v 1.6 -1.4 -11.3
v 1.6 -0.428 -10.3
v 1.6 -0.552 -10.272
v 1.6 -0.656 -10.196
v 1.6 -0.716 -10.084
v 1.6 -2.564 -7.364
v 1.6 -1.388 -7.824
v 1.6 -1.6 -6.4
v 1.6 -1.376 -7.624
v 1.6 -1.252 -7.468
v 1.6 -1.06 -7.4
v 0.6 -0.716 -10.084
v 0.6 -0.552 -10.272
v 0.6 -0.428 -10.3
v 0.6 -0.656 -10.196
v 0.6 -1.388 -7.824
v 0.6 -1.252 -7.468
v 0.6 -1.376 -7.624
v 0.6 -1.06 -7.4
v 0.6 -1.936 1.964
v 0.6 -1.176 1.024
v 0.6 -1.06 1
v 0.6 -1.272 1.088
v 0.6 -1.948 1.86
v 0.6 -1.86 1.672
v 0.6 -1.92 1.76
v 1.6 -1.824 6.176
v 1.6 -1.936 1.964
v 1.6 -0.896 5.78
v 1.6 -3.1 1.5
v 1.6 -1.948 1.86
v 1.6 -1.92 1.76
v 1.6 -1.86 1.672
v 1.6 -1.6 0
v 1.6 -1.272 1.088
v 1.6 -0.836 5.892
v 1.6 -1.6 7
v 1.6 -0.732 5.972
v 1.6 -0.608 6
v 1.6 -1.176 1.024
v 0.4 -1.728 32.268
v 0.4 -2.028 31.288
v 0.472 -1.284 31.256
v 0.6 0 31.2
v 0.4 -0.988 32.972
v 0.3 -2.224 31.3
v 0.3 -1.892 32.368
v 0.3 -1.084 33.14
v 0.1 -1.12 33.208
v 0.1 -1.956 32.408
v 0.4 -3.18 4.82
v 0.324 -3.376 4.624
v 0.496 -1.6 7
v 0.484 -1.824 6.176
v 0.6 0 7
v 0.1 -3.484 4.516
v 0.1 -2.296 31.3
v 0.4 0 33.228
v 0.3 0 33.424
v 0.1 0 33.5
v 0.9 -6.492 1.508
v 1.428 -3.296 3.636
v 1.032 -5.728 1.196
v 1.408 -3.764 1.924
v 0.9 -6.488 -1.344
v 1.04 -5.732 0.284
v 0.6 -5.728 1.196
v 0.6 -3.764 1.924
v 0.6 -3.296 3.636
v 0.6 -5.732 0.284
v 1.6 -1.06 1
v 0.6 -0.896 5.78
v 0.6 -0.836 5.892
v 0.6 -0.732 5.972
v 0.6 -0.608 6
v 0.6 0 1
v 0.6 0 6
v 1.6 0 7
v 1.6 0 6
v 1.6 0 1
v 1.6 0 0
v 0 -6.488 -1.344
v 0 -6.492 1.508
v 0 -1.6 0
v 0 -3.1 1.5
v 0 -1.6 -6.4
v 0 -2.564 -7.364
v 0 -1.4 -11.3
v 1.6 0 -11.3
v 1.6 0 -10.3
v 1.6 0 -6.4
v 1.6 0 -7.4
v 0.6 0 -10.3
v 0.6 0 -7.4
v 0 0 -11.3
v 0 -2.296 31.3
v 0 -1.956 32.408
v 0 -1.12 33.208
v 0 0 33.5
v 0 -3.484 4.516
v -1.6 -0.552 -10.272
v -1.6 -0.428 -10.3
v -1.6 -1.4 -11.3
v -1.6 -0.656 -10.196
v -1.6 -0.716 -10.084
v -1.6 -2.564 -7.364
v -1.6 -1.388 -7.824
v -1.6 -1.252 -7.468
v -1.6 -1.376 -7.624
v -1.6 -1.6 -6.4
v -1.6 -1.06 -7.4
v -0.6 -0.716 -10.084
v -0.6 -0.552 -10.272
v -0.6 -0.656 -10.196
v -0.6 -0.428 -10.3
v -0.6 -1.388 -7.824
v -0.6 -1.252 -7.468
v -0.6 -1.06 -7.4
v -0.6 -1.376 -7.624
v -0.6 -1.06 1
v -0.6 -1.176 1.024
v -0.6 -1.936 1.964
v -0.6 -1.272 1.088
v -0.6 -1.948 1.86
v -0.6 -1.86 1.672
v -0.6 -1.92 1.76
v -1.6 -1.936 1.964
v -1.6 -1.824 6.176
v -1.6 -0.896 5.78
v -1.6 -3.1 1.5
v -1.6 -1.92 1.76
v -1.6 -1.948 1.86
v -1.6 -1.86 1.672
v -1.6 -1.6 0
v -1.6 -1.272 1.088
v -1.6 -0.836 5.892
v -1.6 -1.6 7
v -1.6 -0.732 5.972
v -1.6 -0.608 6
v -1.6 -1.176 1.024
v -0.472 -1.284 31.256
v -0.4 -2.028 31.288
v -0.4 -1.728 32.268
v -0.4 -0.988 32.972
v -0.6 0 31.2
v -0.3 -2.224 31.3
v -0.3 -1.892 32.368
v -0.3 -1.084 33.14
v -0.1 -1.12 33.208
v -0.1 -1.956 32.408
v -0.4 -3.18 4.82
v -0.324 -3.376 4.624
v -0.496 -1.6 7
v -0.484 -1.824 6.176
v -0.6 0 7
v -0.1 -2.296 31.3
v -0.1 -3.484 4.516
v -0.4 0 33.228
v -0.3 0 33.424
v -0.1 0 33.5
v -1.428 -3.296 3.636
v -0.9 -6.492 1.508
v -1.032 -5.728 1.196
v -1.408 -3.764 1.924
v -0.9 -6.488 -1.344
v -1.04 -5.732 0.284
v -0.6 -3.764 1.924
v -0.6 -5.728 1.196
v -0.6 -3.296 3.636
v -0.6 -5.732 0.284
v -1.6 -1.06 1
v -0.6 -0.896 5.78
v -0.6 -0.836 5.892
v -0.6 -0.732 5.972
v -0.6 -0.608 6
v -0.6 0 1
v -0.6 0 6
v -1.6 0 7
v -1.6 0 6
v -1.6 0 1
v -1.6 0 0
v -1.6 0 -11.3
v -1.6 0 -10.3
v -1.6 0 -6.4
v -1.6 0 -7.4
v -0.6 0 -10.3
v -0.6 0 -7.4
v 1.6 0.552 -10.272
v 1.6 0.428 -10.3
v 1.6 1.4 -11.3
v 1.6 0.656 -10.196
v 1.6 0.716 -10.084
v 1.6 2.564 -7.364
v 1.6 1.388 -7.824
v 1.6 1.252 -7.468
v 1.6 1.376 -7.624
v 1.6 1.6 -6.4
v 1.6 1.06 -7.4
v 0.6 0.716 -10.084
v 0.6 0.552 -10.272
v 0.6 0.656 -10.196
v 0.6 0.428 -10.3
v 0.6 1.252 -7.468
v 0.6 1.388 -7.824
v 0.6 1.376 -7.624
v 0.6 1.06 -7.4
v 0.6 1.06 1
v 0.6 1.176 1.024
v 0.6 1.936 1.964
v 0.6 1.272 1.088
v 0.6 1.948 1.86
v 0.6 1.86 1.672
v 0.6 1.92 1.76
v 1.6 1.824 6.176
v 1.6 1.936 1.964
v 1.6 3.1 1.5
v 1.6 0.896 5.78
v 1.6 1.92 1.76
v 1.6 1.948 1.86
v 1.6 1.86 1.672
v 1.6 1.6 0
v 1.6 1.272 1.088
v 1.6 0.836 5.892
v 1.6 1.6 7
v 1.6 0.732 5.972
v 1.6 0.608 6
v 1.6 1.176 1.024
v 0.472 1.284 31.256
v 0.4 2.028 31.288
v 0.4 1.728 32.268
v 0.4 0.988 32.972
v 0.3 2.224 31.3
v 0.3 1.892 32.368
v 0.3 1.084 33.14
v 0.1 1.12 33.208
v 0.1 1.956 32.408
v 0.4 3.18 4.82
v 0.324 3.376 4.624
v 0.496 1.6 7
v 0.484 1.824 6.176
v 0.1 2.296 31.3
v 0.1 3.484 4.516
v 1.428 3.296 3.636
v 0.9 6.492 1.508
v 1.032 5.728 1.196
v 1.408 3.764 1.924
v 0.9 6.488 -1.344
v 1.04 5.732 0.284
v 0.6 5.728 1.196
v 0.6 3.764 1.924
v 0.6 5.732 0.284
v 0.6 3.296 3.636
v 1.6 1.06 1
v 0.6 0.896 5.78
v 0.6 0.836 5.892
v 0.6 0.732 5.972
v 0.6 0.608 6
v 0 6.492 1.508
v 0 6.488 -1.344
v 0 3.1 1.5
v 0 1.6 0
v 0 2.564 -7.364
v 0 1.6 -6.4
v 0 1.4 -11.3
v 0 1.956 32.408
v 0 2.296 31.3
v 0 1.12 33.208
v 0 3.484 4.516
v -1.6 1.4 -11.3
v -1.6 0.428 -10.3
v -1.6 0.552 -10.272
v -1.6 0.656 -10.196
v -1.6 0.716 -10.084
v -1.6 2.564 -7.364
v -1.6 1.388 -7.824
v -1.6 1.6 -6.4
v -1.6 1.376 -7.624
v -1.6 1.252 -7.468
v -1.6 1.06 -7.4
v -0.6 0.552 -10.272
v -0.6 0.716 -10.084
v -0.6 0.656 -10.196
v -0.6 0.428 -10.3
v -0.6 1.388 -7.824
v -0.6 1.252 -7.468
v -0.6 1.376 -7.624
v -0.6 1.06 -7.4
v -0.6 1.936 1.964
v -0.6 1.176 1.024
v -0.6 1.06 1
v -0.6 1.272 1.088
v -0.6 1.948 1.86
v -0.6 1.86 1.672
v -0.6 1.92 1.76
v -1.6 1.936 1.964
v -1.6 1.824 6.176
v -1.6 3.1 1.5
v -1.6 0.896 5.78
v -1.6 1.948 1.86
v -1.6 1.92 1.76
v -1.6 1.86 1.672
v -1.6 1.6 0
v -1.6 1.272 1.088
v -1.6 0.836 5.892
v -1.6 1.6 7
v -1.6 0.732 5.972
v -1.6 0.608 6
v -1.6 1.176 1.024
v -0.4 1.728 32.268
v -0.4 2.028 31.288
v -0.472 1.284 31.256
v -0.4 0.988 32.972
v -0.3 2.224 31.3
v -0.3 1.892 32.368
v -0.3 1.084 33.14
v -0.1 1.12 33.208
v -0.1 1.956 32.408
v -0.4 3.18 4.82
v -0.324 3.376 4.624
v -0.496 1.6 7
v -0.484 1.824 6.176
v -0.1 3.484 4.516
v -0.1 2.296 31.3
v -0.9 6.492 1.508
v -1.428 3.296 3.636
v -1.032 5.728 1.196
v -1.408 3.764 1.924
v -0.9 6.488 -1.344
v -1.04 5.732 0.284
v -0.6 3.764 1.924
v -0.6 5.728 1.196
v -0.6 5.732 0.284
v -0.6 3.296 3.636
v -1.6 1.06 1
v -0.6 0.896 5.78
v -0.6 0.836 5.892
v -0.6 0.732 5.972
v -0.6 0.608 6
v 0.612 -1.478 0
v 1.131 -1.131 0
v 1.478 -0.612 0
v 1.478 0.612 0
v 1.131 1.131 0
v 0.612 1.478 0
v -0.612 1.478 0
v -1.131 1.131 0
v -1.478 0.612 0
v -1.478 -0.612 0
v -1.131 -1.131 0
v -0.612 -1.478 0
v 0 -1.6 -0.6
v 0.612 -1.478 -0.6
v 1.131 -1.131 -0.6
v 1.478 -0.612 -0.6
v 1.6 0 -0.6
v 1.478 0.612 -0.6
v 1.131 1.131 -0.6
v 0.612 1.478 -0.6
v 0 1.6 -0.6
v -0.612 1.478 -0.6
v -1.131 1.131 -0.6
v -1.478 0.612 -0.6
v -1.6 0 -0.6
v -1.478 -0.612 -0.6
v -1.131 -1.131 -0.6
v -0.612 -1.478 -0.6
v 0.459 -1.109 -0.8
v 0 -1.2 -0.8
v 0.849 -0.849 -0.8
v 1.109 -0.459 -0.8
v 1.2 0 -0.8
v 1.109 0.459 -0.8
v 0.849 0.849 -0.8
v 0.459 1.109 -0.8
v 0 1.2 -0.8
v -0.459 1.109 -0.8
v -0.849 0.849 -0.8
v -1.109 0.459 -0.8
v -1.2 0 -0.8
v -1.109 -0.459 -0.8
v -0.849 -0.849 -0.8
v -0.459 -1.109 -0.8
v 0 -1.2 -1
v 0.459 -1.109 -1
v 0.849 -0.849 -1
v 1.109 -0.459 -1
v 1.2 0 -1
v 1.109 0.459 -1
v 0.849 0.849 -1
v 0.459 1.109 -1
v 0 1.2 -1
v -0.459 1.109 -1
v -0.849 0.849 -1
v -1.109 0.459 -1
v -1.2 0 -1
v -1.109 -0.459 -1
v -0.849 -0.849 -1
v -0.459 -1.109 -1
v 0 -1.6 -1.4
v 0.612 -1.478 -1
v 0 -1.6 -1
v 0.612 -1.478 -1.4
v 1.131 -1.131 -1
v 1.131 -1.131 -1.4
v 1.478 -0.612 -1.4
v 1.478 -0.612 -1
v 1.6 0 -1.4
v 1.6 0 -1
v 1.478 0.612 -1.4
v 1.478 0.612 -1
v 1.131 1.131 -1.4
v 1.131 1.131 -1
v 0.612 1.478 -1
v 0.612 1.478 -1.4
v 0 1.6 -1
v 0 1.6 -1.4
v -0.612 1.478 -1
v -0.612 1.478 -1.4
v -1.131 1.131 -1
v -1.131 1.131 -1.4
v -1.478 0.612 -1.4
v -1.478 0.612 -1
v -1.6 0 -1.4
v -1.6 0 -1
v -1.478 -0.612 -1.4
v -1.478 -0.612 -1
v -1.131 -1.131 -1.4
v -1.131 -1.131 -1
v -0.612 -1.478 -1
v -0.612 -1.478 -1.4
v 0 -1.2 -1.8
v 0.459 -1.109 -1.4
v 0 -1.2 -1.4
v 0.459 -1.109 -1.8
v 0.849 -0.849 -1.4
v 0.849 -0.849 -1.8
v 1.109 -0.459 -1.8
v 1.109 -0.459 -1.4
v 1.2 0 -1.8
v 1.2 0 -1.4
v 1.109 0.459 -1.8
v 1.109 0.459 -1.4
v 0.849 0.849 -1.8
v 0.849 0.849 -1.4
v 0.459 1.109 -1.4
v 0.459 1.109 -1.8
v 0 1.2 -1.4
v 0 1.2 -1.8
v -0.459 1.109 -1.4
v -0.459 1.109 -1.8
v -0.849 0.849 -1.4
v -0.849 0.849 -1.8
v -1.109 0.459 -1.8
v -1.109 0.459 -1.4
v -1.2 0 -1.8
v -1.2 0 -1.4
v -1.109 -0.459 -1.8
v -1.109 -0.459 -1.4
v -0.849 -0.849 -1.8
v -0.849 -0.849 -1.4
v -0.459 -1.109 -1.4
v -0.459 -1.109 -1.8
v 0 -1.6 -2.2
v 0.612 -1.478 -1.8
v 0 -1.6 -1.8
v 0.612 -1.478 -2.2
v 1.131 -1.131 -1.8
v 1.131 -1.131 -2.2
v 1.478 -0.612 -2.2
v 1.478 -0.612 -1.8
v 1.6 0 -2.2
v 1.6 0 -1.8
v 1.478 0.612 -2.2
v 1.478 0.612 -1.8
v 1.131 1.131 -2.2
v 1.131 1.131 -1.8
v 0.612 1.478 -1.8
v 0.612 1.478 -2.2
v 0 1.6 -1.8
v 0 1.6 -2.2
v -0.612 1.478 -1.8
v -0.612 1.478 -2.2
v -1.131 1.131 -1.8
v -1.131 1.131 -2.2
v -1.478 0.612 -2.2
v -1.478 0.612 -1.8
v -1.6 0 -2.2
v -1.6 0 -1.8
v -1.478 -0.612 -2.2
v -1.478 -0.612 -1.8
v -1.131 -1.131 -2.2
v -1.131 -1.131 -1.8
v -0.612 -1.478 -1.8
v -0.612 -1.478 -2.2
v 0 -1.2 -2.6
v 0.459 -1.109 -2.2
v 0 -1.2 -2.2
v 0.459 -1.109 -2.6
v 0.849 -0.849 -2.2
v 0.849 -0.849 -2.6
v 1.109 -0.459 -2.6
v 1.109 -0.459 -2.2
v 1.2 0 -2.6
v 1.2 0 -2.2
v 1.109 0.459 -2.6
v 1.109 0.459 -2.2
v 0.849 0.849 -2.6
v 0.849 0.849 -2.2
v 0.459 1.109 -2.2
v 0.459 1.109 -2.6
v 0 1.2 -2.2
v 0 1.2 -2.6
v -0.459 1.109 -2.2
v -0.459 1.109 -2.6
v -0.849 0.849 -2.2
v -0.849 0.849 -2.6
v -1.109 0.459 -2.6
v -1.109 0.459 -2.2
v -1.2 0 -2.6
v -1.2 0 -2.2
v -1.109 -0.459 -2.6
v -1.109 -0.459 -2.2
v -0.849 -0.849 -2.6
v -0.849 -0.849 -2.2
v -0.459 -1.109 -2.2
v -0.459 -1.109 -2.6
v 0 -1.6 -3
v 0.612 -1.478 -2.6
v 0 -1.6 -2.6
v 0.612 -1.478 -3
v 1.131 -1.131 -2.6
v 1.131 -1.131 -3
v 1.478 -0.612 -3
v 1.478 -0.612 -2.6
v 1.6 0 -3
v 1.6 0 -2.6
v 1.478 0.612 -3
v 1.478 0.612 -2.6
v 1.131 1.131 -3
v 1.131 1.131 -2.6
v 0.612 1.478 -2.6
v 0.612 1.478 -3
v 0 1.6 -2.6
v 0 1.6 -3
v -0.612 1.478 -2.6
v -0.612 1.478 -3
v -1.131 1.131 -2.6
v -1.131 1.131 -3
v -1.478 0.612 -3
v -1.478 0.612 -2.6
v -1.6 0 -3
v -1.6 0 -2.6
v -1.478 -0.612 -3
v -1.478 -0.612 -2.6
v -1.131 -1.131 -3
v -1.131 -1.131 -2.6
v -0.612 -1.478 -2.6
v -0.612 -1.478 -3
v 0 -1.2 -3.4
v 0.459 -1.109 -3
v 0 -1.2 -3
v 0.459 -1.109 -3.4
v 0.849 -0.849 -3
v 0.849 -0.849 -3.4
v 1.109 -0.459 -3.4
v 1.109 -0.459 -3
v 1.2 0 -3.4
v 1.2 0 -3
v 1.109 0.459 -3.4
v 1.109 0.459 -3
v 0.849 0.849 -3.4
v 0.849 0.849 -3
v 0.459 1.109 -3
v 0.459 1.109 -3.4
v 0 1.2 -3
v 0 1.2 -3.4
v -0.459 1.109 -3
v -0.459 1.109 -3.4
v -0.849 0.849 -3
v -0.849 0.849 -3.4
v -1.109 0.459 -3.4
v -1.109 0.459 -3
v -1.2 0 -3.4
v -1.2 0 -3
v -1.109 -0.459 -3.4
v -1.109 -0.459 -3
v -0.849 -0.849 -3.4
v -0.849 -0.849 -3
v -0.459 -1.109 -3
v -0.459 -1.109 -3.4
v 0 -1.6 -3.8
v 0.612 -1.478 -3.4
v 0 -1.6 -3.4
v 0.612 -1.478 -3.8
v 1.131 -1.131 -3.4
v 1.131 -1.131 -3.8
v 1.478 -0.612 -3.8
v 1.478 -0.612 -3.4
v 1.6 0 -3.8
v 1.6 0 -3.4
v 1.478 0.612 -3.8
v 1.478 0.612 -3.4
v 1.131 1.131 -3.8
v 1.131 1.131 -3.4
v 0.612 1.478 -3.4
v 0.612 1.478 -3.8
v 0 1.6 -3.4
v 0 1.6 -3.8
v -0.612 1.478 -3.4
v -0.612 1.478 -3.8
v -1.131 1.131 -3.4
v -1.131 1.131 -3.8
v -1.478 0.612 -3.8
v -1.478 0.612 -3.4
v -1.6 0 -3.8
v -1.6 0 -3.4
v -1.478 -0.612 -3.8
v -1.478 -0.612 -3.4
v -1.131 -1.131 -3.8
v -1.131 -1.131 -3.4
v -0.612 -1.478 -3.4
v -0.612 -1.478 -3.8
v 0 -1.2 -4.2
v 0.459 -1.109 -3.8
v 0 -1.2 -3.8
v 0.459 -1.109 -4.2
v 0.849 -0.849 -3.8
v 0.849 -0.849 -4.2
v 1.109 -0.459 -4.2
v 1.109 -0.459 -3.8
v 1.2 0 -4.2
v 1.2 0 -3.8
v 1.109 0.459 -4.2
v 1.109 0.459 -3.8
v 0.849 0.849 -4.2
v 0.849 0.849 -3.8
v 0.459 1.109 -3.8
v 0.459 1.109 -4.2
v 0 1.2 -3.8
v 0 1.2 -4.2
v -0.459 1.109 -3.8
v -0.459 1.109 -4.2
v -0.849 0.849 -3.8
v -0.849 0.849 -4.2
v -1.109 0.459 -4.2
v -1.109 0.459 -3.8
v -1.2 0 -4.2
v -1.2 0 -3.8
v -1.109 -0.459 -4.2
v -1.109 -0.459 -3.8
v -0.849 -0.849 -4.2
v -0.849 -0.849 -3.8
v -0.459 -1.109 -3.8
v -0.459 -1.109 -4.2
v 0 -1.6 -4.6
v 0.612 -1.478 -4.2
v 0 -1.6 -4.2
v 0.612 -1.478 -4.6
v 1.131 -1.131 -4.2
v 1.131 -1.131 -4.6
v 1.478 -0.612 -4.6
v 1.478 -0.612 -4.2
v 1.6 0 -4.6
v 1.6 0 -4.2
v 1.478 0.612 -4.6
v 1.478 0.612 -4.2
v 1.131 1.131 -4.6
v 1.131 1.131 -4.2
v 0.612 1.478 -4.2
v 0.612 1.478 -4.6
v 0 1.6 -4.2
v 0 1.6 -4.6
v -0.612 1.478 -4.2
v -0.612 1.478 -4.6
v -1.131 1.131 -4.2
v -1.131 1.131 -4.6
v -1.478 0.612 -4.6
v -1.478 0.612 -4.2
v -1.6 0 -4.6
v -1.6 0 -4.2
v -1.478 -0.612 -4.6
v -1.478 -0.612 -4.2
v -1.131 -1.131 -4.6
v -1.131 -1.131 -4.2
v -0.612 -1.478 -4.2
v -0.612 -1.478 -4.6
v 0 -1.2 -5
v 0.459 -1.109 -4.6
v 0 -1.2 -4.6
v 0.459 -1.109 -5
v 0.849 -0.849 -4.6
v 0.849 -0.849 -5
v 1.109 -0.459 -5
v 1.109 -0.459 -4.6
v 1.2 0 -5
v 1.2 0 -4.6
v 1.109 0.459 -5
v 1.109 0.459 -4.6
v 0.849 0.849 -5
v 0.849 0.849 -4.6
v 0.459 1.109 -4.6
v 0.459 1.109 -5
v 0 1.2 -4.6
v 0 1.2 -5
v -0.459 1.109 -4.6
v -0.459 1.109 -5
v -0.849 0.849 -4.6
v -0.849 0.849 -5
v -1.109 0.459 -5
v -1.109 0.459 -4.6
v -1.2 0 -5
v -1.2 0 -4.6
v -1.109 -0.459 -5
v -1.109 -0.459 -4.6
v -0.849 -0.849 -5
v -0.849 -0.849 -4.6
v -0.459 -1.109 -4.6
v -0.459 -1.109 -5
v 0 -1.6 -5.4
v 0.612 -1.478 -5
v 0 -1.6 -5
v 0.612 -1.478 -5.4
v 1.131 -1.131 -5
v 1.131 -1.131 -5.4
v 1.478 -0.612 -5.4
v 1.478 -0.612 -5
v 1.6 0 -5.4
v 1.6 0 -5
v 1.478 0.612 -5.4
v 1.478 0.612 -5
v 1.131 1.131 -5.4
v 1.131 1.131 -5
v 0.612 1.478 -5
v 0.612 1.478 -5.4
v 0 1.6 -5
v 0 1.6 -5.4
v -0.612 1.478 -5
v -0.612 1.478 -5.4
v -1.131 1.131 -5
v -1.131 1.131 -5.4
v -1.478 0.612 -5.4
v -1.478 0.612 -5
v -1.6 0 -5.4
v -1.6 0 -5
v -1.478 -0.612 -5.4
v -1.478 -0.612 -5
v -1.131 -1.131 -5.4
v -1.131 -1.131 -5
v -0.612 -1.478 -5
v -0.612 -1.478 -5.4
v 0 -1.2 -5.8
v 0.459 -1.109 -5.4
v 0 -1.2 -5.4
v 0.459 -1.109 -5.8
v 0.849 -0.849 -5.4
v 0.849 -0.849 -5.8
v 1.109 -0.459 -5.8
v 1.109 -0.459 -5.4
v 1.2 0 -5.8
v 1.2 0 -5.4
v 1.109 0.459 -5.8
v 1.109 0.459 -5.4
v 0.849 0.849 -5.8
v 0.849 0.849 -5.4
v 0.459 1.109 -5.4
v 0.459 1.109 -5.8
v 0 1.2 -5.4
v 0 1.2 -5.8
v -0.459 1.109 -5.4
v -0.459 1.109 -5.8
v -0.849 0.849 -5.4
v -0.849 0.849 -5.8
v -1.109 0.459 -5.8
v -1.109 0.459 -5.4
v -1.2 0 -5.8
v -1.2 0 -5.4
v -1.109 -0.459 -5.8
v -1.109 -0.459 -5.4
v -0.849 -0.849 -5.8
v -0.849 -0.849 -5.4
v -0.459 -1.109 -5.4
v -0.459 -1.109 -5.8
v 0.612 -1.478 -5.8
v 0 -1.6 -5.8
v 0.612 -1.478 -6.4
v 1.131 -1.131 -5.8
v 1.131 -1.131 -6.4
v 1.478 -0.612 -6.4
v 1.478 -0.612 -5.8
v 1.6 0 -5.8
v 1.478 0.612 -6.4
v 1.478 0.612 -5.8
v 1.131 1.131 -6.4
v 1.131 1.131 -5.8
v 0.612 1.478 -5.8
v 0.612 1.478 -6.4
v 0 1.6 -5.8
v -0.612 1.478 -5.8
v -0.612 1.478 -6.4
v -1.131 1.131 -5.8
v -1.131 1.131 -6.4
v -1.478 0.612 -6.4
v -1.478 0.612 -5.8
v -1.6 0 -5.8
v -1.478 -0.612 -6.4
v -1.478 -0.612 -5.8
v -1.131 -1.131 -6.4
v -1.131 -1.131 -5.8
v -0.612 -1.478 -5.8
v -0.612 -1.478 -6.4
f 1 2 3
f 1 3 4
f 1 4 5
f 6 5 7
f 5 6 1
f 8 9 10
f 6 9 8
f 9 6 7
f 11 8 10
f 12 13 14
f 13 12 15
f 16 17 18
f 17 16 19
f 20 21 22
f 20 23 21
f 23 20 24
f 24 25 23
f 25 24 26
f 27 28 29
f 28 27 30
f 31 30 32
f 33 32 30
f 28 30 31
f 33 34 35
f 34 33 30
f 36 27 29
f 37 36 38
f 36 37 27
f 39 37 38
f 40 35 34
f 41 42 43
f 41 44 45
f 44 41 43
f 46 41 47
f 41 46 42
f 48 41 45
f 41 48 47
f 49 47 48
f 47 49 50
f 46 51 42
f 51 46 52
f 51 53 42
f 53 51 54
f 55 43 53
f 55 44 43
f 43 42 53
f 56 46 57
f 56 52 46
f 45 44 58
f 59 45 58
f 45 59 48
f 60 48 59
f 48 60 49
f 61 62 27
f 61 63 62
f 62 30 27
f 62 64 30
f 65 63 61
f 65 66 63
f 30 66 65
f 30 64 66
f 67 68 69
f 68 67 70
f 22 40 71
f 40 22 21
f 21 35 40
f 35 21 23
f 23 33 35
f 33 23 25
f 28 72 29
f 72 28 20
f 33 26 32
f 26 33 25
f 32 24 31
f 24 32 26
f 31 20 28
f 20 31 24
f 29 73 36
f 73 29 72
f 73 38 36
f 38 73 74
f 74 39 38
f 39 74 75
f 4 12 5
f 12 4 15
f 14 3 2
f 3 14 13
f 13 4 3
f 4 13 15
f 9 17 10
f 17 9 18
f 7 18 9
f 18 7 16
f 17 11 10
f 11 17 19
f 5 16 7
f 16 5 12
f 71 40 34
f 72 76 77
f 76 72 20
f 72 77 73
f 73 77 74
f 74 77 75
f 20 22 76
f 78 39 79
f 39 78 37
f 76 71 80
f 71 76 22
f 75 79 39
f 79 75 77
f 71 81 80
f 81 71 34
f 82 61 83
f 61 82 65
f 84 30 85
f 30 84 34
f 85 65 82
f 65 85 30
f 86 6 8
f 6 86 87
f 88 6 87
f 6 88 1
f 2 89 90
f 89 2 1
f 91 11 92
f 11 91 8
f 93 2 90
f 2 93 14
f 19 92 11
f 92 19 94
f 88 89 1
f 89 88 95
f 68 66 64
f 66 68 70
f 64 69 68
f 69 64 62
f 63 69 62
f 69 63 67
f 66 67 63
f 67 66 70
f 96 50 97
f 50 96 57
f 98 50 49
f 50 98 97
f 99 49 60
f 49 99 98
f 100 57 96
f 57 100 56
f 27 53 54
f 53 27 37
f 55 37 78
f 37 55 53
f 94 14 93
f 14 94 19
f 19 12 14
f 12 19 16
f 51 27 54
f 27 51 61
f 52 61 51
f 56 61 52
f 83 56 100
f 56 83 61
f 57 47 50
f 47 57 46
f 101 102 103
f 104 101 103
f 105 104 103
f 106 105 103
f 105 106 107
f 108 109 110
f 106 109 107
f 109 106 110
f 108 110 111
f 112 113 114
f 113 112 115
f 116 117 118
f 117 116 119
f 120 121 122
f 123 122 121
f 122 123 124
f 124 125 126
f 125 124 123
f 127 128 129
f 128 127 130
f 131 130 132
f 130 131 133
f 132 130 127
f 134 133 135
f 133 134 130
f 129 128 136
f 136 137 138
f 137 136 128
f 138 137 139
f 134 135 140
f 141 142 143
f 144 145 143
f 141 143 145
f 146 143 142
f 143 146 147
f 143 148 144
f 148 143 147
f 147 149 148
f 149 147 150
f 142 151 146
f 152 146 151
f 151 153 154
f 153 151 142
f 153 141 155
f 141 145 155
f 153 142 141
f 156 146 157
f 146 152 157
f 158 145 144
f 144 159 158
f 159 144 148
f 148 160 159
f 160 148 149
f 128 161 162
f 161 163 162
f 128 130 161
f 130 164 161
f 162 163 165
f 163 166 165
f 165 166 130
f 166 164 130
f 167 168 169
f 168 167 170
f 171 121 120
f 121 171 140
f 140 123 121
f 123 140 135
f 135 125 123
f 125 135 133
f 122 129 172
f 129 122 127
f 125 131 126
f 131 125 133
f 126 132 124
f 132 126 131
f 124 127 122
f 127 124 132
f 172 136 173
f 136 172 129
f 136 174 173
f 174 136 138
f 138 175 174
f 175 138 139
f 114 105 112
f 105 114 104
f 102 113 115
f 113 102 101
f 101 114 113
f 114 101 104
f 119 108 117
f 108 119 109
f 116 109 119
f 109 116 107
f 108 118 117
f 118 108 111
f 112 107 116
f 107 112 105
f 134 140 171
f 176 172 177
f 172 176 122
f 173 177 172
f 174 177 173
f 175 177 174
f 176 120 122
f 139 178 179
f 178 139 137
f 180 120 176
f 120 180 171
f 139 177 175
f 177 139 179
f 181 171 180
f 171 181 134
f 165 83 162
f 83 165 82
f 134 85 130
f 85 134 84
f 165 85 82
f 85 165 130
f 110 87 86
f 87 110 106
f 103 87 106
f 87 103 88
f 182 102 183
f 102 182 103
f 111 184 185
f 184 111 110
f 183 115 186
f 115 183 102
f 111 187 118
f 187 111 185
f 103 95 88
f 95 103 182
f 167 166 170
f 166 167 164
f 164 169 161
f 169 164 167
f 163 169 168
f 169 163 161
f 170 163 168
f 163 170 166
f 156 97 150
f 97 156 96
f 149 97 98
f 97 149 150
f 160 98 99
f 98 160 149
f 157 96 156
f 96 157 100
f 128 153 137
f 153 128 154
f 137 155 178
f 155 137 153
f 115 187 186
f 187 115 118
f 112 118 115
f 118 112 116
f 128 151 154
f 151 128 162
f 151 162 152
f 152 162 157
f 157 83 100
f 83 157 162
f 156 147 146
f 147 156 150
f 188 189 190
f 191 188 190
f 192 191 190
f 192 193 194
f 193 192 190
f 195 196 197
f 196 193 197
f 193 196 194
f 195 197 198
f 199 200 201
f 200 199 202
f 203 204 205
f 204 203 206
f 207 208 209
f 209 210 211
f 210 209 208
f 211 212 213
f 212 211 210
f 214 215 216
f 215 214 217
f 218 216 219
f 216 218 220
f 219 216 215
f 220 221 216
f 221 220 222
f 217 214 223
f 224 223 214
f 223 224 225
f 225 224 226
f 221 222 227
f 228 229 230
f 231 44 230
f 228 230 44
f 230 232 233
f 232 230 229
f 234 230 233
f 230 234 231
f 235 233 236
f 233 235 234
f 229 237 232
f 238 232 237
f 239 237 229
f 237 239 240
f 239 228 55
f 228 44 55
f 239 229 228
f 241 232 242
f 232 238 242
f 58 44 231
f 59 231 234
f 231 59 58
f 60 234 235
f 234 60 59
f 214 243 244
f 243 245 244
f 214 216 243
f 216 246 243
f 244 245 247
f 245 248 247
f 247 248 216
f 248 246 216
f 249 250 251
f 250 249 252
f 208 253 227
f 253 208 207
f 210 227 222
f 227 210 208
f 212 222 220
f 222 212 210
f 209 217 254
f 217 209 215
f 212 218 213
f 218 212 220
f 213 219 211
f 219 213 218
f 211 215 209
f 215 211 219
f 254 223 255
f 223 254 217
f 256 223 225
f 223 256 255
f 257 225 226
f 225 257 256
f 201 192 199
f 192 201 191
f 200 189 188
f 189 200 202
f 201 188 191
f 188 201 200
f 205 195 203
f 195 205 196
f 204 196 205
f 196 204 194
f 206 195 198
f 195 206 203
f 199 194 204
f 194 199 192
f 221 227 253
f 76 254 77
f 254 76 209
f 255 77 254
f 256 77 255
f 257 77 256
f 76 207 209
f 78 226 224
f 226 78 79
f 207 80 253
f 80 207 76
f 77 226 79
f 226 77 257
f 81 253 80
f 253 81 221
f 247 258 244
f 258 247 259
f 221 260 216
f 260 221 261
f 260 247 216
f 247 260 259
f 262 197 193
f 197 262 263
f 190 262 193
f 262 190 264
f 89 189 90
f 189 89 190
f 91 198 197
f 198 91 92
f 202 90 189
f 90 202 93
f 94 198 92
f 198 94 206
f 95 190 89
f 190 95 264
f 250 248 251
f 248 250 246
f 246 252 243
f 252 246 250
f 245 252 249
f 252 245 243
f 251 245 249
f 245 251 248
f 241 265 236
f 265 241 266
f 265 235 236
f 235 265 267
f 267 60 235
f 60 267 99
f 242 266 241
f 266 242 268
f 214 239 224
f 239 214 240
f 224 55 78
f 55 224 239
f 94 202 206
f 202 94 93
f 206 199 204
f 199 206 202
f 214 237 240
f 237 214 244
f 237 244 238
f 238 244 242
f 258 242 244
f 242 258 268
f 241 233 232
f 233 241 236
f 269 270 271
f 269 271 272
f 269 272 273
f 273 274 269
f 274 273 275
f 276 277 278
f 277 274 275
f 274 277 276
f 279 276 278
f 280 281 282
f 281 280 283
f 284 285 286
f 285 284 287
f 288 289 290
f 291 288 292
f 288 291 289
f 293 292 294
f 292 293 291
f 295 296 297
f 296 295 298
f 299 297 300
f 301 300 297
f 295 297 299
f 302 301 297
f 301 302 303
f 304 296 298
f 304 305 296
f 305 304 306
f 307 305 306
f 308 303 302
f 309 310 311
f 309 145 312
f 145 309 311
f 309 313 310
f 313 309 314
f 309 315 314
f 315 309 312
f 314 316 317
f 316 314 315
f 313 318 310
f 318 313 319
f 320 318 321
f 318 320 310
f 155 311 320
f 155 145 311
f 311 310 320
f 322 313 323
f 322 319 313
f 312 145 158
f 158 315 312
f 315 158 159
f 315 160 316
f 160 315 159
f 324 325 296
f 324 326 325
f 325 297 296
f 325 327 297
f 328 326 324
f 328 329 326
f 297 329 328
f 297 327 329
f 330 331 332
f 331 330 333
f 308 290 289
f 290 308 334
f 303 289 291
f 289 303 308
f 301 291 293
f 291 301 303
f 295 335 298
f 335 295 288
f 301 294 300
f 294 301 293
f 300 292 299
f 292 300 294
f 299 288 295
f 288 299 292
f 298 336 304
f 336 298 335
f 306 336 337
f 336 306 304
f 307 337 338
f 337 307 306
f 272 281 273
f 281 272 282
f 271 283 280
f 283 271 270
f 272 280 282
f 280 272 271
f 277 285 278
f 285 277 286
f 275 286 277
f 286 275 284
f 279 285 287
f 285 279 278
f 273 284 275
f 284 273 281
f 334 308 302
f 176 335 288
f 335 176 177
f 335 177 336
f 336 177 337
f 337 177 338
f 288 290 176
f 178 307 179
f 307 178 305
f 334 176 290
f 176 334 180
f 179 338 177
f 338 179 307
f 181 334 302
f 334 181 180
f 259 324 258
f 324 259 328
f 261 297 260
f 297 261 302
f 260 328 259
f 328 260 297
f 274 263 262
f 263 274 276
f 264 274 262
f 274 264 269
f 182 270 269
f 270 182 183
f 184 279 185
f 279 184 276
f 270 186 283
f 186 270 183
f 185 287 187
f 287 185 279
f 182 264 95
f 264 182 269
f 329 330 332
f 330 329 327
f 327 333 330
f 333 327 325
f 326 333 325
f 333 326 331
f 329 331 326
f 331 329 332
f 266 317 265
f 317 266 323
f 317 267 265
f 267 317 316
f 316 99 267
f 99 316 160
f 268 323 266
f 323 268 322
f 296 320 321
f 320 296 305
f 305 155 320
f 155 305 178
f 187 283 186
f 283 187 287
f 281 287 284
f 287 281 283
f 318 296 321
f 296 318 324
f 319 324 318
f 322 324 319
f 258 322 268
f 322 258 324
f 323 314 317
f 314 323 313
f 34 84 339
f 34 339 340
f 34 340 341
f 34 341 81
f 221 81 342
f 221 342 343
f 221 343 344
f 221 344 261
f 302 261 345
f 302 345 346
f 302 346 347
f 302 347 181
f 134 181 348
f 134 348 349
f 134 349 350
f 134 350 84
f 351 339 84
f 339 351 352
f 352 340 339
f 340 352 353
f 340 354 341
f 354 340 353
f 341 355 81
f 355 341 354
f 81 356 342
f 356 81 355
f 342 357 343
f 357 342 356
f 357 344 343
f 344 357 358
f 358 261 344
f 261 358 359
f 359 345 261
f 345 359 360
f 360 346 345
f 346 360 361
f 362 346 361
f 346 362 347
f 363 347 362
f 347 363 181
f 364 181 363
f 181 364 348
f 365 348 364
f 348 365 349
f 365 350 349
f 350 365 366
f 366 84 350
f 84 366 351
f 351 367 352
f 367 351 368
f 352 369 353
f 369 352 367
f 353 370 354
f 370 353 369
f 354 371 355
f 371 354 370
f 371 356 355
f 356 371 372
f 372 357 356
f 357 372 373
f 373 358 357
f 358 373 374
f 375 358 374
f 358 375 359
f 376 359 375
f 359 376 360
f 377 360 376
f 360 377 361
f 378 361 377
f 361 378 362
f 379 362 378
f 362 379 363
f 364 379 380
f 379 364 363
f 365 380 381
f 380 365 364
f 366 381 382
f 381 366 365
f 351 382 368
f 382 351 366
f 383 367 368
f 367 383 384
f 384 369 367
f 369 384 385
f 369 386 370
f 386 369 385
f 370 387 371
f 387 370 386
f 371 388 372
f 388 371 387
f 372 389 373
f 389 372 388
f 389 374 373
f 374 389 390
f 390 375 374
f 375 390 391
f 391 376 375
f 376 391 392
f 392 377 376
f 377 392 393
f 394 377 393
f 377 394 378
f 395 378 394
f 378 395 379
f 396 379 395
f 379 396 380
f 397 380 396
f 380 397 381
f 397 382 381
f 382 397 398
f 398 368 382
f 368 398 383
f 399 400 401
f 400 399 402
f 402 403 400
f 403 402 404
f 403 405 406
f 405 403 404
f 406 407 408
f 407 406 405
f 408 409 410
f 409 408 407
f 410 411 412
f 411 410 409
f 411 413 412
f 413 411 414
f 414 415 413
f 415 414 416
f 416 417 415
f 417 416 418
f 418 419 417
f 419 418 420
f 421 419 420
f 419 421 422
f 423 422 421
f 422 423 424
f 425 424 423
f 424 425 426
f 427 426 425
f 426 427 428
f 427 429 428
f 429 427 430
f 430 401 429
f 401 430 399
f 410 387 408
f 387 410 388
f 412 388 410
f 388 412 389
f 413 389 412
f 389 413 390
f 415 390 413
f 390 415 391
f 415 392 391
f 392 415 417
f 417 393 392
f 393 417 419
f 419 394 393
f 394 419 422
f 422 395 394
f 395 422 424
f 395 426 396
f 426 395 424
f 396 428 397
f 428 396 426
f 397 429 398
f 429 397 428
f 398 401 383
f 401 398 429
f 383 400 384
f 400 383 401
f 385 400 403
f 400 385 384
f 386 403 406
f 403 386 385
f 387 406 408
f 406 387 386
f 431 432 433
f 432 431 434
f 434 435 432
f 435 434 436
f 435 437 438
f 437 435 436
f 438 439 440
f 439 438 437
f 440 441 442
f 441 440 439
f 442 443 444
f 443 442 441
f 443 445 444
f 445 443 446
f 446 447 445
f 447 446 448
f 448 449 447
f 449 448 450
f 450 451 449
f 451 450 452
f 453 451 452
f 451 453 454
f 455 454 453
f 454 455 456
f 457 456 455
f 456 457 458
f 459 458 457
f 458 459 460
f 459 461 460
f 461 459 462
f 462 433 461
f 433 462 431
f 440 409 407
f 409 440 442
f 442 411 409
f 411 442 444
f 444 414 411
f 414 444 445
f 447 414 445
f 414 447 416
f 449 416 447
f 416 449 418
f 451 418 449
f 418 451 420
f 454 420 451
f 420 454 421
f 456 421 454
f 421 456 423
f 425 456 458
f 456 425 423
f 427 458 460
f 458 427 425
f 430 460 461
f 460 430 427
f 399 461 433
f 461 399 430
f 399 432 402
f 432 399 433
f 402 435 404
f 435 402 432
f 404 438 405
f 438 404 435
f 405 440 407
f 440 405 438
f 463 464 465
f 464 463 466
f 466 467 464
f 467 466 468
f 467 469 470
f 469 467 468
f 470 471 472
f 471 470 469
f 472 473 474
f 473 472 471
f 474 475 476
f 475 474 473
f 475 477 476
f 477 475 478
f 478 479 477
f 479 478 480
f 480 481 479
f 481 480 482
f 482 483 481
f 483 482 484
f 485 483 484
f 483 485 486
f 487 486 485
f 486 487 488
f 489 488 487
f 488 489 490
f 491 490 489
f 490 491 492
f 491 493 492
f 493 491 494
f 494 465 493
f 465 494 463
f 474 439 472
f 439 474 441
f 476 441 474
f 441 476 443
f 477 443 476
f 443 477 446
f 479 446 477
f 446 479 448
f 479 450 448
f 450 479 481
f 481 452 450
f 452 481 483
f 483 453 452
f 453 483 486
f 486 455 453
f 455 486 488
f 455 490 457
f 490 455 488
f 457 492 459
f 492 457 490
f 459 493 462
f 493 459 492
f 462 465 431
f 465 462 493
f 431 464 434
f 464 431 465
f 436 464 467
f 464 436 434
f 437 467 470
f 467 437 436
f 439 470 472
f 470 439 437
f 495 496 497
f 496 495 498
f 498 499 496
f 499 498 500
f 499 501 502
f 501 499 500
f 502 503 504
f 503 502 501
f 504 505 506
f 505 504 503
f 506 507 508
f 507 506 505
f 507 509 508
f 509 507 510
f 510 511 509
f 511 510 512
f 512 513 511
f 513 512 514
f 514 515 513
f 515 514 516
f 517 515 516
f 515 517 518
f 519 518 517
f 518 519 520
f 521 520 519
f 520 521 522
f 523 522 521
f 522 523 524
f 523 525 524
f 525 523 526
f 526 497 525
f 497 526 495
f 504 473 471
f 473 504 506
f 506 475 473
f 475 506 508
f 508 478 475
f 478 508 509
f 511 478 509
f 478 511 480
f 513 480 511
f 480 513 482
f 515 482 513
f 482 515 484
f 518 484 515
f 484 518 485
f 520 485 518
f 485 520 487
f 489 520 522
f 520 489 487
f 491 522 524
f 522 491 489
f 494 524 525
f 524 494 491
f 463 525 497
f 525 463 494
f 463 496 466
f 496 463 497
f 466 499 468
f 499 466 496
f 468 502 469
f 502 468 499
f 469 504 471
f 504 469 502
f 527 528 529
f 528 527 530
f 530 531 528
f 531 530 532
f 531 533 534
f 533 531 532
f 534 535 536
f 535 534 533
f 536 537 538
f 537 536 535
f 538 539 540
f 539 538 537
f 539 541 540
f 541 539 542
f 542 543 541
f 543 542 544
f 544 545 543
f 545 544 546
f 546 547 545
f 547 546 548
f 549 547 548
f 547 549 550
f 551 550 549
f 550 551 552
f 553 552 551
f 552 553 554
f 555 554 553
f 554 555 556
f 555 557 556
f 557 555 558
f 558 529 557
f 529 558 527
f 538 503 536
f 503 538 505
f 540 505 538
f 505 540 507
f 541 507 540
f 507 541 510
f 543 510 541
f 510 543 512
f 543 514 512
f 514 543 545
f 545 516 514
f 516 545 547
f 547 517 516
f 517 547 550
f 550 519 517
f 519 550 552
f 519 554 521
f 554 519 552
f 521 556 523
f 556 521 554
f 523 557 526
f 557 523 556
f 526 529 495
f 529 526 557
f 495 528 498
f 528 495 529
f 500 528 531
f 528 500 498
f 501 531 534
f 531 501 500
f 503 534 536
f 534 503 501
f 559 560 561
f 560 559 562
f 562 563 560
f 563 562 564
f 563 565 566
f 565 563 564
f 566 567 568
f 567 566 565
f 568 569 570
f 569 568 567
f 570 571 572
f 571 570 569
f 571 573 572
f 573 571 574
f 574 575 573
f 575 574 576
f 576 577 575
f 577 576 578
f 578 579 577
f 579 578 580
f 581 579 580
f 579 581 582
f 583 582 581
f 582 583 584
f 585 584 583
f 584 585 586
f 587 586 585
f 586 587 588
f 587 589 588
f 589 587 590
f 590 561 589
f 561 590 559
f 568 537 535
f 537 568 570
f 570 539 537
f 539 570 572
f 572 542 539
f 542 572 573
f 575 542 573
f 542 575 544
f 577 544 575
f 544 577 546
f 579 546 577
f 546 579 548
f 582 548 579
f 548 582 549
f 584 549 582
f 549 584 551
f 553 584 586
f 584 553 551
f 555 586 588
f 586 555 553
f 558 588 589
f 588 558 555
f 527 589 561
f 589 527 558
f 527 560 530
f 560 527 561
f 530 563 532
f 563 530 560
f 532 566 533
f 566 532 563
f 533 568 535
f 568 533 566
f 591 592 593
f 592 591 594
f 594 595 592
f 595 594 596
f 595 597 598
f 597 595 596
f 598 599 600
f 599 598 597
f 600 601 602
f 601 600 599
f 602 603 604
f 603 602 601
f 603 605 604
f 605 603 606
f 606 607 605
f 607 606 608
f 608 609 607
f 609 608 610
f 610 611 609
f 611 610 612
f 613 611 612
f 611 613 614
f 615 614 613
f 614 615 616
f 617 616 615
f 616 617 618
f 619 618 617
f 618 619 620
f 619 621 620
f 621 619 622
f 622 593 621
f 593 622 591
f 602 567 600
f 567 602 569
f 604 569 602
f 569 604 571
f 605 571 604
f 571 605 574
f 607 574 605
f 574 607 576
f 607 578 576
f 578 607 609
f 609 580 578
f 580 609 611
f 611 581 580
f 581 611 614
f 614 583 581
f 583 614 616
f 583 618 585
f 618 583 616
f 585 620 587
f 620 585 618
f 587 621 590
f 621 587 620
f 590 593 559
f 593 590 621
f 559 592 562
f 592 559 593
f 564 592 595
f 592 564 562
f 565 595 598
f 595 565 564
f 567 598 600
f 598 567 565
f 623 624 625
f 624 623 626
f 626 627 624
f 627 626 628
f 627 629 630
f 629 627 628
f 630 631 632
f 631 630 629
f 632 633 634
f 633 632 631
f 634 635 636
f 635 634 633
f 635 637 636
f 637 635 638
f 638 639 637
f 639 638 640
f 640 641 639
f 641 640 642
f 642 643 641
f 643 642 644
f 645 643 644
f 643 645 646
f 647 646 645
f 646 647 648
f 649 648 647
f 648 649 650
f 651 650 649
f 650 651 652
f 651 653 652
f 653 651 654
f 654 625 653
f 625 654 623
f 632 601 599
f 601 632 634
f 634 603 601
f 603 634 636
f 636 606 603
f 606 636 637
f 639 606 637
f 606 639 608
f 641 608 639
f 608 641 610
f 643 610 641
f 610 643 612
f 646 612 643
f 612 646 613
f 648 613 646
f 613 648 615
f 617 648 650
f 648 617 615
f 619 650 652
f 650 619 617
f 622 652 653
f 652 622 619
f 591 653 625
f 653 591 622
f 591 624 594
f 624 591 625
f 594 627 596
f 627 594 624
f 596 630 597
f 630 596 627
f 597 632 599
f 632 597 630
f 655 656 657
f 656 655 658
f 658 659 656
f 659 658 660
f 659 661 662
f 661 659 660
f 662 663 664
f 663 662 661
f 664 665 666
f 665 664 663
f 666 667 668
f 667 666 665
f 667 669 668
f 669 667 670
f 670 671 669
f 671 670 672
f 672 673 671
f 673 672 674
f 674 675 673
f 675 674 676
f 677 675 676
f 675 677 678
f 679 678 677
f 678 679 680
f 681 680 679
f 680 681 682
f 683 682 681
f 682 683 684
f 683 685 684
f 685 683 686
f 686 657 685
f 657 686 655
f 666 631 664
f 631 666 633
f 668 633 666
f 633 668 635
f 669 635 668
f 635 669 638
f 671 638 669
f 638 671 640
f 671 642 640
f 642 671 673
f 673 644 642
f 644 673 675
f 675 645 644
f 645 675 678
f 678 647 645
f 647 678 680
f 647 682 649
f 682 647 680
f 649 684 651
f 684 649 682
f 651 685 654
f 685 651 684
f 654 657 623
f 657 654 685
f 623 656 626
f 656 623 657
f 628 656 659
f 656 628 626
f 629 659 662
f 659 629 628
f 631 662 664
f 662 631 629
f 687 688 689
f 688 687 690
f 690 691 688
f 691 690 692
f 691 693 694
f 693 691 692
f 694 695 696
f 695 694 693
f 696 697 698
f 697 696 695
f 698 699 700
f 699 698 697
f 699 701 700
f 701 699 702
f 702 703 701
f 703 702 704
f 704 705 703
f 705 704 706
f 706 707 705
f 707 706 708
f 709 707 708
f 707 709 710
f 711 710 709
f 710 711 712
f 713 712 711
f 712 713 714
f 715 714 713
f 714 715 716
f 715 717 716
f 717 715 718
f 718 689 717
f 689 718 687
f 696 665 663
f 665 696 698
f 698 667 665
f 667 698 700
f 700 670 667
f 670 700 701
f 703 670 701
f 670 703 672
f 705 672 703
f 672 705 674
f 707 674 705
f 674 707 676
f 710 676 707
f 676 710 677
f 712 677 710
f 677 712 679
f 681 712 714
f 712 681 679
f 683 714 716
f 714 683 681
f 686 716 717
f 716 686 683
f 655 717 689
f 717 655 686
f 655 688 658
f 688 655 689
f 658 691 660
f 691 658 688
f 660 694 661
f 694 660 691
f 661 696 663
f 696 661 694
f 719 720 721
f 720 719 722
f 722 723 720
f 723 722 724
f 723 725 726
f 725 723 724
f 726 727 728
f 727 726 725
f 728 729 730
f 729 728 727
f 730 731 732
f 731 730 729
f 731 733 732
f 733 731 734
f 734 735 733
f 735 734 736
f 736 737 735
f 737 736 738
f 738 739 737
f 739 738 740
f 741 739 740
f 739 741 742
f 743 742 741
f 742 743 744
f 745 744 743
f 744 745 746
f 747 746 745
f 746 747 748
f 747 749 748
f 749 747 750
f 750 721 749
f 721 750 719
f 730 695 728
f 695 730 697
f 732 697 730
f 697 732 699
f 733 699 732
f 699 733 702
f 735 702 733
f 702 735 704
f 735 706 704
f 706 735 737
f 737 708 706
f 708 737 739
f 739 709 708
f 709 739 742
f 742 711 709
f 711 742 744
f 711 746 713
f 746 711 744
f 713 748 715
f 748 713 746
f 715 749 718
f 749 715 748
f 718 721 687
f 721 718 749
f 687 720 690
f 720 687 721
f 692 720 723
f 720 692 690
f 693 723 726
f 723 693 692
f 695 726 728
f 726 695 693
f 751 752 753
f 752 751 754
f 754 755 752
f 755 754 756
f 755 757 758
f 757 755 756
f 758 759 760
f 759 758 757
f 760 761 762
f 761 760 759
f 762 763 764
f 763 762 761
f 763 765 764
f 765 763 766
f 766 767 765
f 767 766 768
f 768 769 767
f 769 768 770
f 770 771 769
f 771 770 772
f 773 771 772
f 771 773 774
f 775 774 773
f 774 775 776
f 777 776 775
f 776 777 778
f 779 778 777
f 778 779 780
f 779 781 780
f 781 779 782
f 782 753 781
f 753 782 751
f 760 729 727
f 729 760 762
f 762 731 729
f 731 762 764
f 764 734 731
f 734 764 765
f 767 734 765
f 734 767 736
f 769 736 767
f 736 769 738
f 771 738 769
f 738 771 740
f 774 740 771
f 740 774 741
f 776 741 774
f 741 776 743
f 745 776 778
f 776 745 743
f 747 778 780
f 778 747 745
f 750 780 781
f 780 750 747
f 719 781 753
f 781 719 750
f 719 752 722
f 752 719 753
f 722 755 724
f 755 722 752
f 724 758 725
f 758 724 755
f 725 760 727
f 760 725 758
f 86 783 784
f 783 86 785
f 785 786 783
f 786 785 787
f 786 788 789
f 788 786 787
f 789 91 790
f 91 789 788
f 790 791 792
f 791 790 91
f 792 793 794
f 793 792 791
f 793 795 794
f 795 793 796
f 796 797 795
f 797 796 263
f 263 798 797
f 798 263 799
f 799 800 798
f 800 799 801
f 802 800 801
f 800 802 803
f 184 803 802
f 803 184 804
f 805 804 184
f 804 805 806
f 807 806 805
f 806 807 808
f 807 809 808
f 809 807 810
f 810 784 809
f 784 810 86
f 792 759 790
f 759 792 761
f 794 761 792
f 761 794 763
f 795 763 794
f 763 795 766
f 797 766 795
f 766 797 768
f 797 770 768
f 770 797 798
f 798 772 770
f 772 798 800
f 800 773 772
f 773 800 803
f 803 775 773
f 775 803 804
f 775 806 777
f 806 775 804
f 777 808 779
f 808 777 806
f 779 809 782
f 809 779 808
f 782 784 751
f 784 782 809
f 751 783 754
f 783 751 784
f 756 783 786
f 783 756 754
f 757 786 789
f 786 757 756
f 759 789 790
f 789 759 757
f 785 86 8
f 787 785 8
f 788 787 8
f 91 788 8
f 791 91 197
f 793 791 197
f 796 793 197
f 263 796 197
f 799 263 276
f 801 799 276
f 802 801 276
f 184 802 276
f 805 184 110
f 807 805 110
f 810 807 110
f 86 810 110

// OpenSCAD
use <../lib.scad>
use <../p/4-4con3.scad>
use <../p/4-4cyli.scad>
use <../p/4-4edge.scad>
use <../p/4-4ndis.scad>
use <../p/4-4ring3.scad>
use <s/48495s01.scad>
$fa=1; $fs=0.2;
function ldraw_lib__48495(realsolid=false) = [
// 0 Minifig Sword with Angular Hilt
// 0 Name: 48495.dat
// 0 Author: Andy Westrate [westrate]
// 0 !LDRAW_ORG Part UPDATE 2012-03
// 0 !LICENSE Licensed under CC BY 2.0 and CC BY 4.0 : see CAreadme.txt
// 
// 0 BFC CERTIFY CCW
  [0,"BFC","CERTIFY"],
  [0,"BFC","CCW"],
// 
// 0 !CATEGORY Minifig Accessory
// 
// 0 !HISTORY 2009-10-13 {LEGO Universe Team} Original part shape
// 0 !HISTORY 2009-12-01 [westrate] File preparation for LDraw Parts Tracker
// 0 !HISTORY 2012-12-28 [PTadmin] Official Update 2012-03
// 
// 
// 1 16 0 0 0 0 0 1 0 1 0 -1 0 0 s\48495s01.dat
  [1,16,0,0,0,0,0,1,0,1,0,-1,0,0, ldraw_lib__s__48495s01(realsolid)],
// 1 16 0 0 0 0 0 -1 0 1 0 -1 0 0 s\48495s01.dat
  [1,16,0,0,0,0,0,-1,0,1,0,-1,0,0, ldraw_lib__s__48495s01(realsolid)],
// 1 16 0 0 0 0 0 1 0 1 0 1 0 0 s\48495s01.dat
  [1,16,0,0,0,0,0,1,0,1,0,1,0,0, ldraw_lib__s__48495s01(realsolid)],
// 1 16 0 0 0 0 0 -1 0 1 0 1 0 0 s\48495s01.dat
  [1,16,0,0,0,0,0,-1,0,1,0,1,0,0, ldraw_lib__s__48495s01(realsolid)],
// 1 16 0 0 0 0 0 4 0 -1 0 -4 0 0 4-4ndis.dat
  [1,16,0,0,0,0,0,4,0,-1,0,-4,0,0, ldraw_lib__4_4ndis(realsolid)],
// 1 16 0 0 0 0 0 4 0 1.5 0 -4 0 0 4-4cyli.dat
  [1,16,0,0,0,0,0,4,0,1.5,0,-4,0,0, ldraw_lib__4_4cyli(realsolid)],
// 1 16 0 0 0 0 0 4 0 1.5 0 -4 0 0 4-4edge.dat
  [1,16,0,0,0,0,0,4,0,1.5,0,-4,0,0, ldraw_lib__4_4edge(realsolid)],
// 1 16 0 1.5 0 0 0 1 0 0.5 0 -1 0 0 4-4con3.dat
  [1,16,0,1.5,0,0,0,1,0,0.5,0,-1,0,0, ldraw_lib__4_4con3(realsolid)],
// 1 16 0 1.5 0 0 0 4 0 1 0 -4 0 0 4-4edge.dat
  [1,16,0,1.5,0,0,0,4,0,1,0,-4,0,0, ldraw_lib__4_4edge(realsolid)],
// 1 16 0 2 0 0 0 3 0 1 0 -3 0 0 4-4edge.dat
  [1,16,0,2,0,0,0,3,0,1,0,-3,0,0, ldraw_lib__4_4edge(realsolid)],
// 1 16 0 2 0 0 0 3 0 0.5 0 -3 0 0 4-4cyli.dat
  [1,16,0,2,0,0,0,3,0,0.5,0,-3,0,0, ldraw_lib__4_4cyli(realsolid)],
// 1 16 0 2.5 0 0 0 3 0 1 0 -3 0 0 4-4edge.dat
  [1,16,0,2.5,0,0,0,3,0,1,0,-3,0,0, ldraw_lib__4_4edge(realsolid)],
// 1 16 0 2.5 0 0 0 4 0 1 0 -4 0 0 4-4cyli.dat
  [1,16,0,2.5,0,0,0,4,0,1,0,-4,0,0, ldraw_lib__4_4cyli(realsolid)],
// 1 16 0 2.5 0 0 0 4 0 1 0 -4 0 0 4-4edge.dat
  [1,16,0,2.5,0,0,0,4,0,1,0,-4,0,0, ldraw_lib__4_4edge(realsolid)],
// 1 16 0 2.5 0 0 0 1 0 1 0 -1 0 0 4-4ring3.dat
  [1,16,0,2.5,0,0,0,1,0,1,0,-1,0,0, ldraw_lib__4_4ring3(realsolid)],
// 1 16 0 3.5 0 0 0 3 0 1 0 -3 0 0 4-4cyli.dat
  [1,16,0,3.5,0,0,0,3,0,1,0,-3,0,0, ldraw_lib__4_4cyli(realsolid)],
// 1 16 0 3.5 0 0 0 4 0 1 0 -4 0 0 4-4edge.dat
  [1,16,0,3.5,0,0,0,4,0,1,0,-4,0,0, ldraw_lib__4_4edge(realsolid)],
// 1 16 0 3.5 0 0 0 3 0 1 0 -3 0 0 4-4edge.dat
  [1,16,0,3.5,0,0,0,3,0,1,0,-3,0,0, ldraw_lib__4_4edge(realsolid)],
// 1 16 0 3.5 0 0 0 1 0 -1 0 -1 0 0 4-4ring3.dat
  [1,16,0,3.5,0,0,0,1,0,-1,0,-1,0,0, ldraw_lib__4_4ring3(realsolid)],
// 1 16 0 4.5 0 0 0 4 0 1 0 -4 0 0 4-4cyli.dat
  [1,16,0,4.5,0,0,0,4,0,1,0,-4,0,0, ldraw_lib__4_4cyli(realsolid)],
// 1 16 0 4.5 0 0 0 4 0 1 0 -4 0 0 4-4edge.dat
  [1,16,0,4.5,0,0,0,4,0,1,0,-4,0,0, ldraw_lib__4_4edge(realsolid)],
// 1 16 0 4.5 0 0 0 3 0 1 0 -3 0 0 4-4edge.dat
  [1,16,0,4.5,0,0,0,3,0,1,0,-3,0,0, ldraw_lib__4_4edge(realsolid)],
// 1 16 0 4.5 0 0 0 1 0 1 0 -1 0 0 4-4ring3.dat
  [1,16,0,4.5,0,0,0,1,0,1,0,-1,0,0, ldraw_lib__4_4ring3(realsolid)],
// 1 16 0 5.5 0 0 0 3 0 1 0 -3 0 0 4-4cyli.dat
  [1,16,0,5.5,0,0,0,3,0,1,0,-3,0,0, ldraw_lib__4_4cyli(realsolid)],
// 1 16 0 5.5 0 0 0 4 0 1 0 -4 0 0 4-4edge.dat
  [1,16,0,5.5,0,0,0,4,0,1,0,-4,0,0, ldraw_lib__4_4edge(realsolid)],
// 1 16 0 5.5 0 0 0 3 0 1 0 -3 0 0 4-4edge.dat
  [1,16,0,5.5,0,0,0,3,0,1,0,-3,0,0, ldraw_lib__4_4edge(realsolid)],
// 1 16 0 5.5 0 0 0 1 0 -1 0 -1 0 0 4-4ring3.dat
  [1,16,0,5.5,0,0,0,1,0,-1,0,-1,0,0, ldraw_lib__4_4ring3(realsolid)],
// 1 16 0 6.5 0 0 0 4 0 1 0 -4 0 0 4-4cyli.dat
  [1,16,0,6.5,0,0,0,4,0,1,0,-4,0,0, ldraw_lib__4_4cyli(realsolid)],
// 1 16 0 6.5 0 0 0 4 0 1 0 -4 0 0 4-4edge.dat
  [1,16,0,6.5,0,0,0,4,0,1,0,-4,0,0, ldraw_lib__4_4edge(realsolid)],
// 1 16 0 6.5 0 0 0 3 0 1 0 -3 0 0 4-4edge.dat
  [1,16,0,6.5,0,0,0,3,0,1,0,-3,0,0, ldraw_lib__4_4edge(realsolid)],
// 1 16 0 6.5 0 0 0 1 0 1 0 -1 0 0 4-4ring3.dat
  [1,16,0,6.5,0,0,0,1,0,1,0,-1,0,0, ldraw_lib__4_4ring3(realsolid)],
// 1 16 0 7.5 0 0 0 3 0 1 0 -3 0 0 4-4cyli.dat
  [1,16,0,7.5,0,0,0,3,0,1,0,-3,0,0, ldraw_lib__4_4cyli(realsolid)],
// 1 16 0 7.5 0 0 0 4 0 1 0 -4 0 0 4-4edge.dat
  [1,16,0,7.5,0,0,0,4,0,1,0,-4,0,0, ldraw_lib__4_4edge(realsolid)],
// 1 16 0 7.5 0 0 0 3 0 1 0 -3 0 0 4-4edge.dat
  [1,16,0,7.5,0,0,0,3,0,1,0,-3,0,0, ldraw_lib__4_4edge(realsolid)],
// 1 16 0 7.5 0 0 0 1 0 -1 0 -1 0 0 4-4ring3.dat
  [1,16,0,7.5,0,0,0,1,0,-1,0,-1,0,0, ldraw_lib__4_4ring3(realsolid)],
// 1 16 0 8.5 0 0 0 4 0 1 0 -4 0 0 4-4cyli.dat
  [1,16,0,8.5,0,0,0,4,0,1,0,-4,0,0, ldraw_lib__4_4cyli(realsolid)],
// 1 16 0 8.5 0 0 0 4 0 1 0 -4 0 0 4-4edge.dat
  [1,16,0,8.5,0,0,0,4,0,1,0,-4,0,0, ldraw_lib__4_4edge(realsolid)],
// 1 16 0 8.5 0 0 0 3 0 1 0 -3 0 0 4-4edge.dat
  [1,16,0,8.5,0,0,0,3,0,1,0,-3,0,0, ldraw_lib__4_4edge(realsolid)],
// 1 16 0 8.5 0 0 0 1 0 1 0 -1 0 0 4-4ring3.dat
  [1,16,0,8.5,0,0,0,1,0,1,0,-1,0,0, ldraw_lib__4_4ring3(realsolid)],
// 1 16 0 9.5 0 0 0 3 0 1 0 -3 0 0 4-4cyli.dat
  [1,16,0,9.5,0,0,0,3,0,1,0,-3,0,0, ldraw_lib__4_4cyli(realsolid)],
// 1 16 0 9.5 0 0 0 4 0 1 0 -4 0 0 4-4edge.dat
  [1,16,0,9.5,0,0,0,4,0,1,0,-4,0,0, ldraw_lib__4_4edge(realsolid)],
// 1 16 0 9.5 0 0 0 3 0 1 0 -3 0 0 4-4edge.dat
  [1,16,0,9.5,0,0,0,3,0,1,0,-3,0,0, ldraw_lib__4_4edge(realsolid)],
// 1 16 0 9.5 0 0 0 1 0 -1 0 -1 0 0 4-4ring3.dat
  [1,16,0,9.5,0,0,0,1,0,-1,0,-1,0,0, ldraw_lib__4_4ring3(realsolid)],
// 1 16 0 10.5 0 0 0 4 0 1 0 -4 0 0 4-4cyli.dat
  [1,16,0,10.5,0,0,0,4,0,1,0,-4,0,0, ldraw_lib__4_4cyli(realsolid)],
// 1 16 0 10.5 0 0 0 4 0 1 0 -4 0 0 4-4edge.dat
  [1,16,0,10.5,0,0,0,4,0,1,0,-4,0,0, ldraw_lib__4_4edge(realsolid)],
// 1 16 0 10.5 0 0 0 3 0 1 0 -3 0 0 4-4edge.dat
  [1,16,0,10.5,0,0,0,3,0,1,0,-3,0,0, ldraw_lib__4_4edge(realsolid)],
// 1 16 0 10.5 0 0 0 1 0 1 0 -1 0 0 4-4ring3.dat
  [1,16,0,10.5,0,0,0,1,0,1,0,-1,0,0, ldraw_lib__4_4ring3(realsolid)],
// 1 16 0 11.5 0 0 0 3 0 1 0 -3 0 0 4-4cyli.dat
  [1,16,0,11.5,0,0,0,3,0,1,0,-3,0,0, ldraw_lib__4_4cyli(realsolid)],
// 1 16 0 11.5 0 0 0 4 0 1 0 -4 0 0 4-4edge.dat
  [1,16,0,11.5,0,0,0,4,0,1,0,-4,0,0, ldraw_lib__4_4edge(realsolid)],
// 1 16 0 11.5 0 0 0 3 0 1 0 -3 0 0 4-4edge.dat
  [1,16,0,11.5,0,0,0,3,0,1,0,-3,0,0, ldraw_lib__4_4edge(realsolid)],
// 1 16 0 11.5 0 0 0 1 0 -1 0 -1 0 0 4-4ring3.dat
  [1,16,0,11.5,0,0,0,1,0,-1,0,-1,0,0, ldraw_lib__4_4ring3(realsolid)],
// 1 16 0 12.5 0 0 0 4 0 1 0 -4 0 0 4-4cyli.dat
  [1,16,0,12.5,0,0,0,4,0,1,0,-4,0,0, ldraw_lib__4_4cyli(realsolid)],
// 1 16 0 12.5 0 0 0 4 0 1 0 -4 0 0 4-4edge.dat
  [1,16,0,12.5,0,0,0,4,0,1,0,-4,0,0, ldraw_lib__4_4edge(realsolid)],
// 1 16 0 12.5 0 0 0 3 0 1 0 -3 0 0 4-4edge.dat
  [1,16,0,12.5,0,0,0,3,0,1,0,-3,0,0, ldraw_lib__4_4edge(realsolid)],
// 1 16 0 12.5 0 0 0 1 0 1 0 -1 0 0 4-4ring3.dat
  [1,16,0,12.5,0,0,0,1,0,1,0,-1,0,0, ldraw_lib__4_4ring3(realsolid)],
// 1 16 0 13.5 0 0 0 3 0 1 0 -3 0 0 4-4cyli.dat
  [1,16,0,13.5,0,0,0,3,0,1,0,-3,0,0, ldraw_lib__4_4cyli(realsolid)],
// 1 16 0 13.5 0 0 0 4 0 1 0 -4 0 0 4-4edge.dat
  [1,16,0,13.5,0,0,0,4,0,1,0,-4,0,0, ldraw_lib__4_4edge(realsolid)],
// 1 16 0 13.5 0 0 0 3 0 1 0 -3 0 0 4-4edge.dat
  [1,16,0,13.5,0,0,0,3,0,1,0,-3,0,0, ldraw_lib__4_4edge(realsolid)],
// 1 16 0 13.5 0 0 0 1 0 -1 0 -1 0 0 4-4ring3.dat
  [1,16,0,13.5,0,0,0,1,0,-1,0,-1,0,0, ldraw_lib__4_4ring3(realsolid)],
// 1 16 0 14.5 0 0 0 4 0 1.5 0 -4 0 0 4-4cyli.dat
  [1,16,0,14.5,0,0,0,4,0,1.5,0,-4,0,0, ldraw_lib__4_4cyli(realsolid)],
// 1 16 0 14.5 0 0 0 4 0 1 0 -4 0 0 4-4edge.dat
  [1,16,0,14.5,0,0,0,4,0,1,0,-4,0,0, ldraw_lib__4_4edge(realsolid)],
// 1 16 0 14.5 0 0 0 3 0 1 0 -3 0 0 4-4edge.dat
  [1,16,0,14.5,0,0,0,3,0,1,0,-3,0,0, ldraw_lib__4_4edge(realsolid)],
// 1 16 0 14.5 0 0 0 1 0 1 0 -1 0 0 4-4ring3.dat
  [1,16,0,14.5,0,0,0,1,0,1,0,-1,0,0, ldraw_lib__4_4ring3(realsolid)],
// 1 16 0 16 0 0 0 4 0 1 0 -4 0 0 4-4ndis.dat
  [1,16,0,16,0,0,0,4,0,1,0,-4,0,0, ldraw_lib__4_4ndis(realsolid)],
// 1 16 0 16 0 0 0 4 0 1 0 -4 0 0 4-4edge.dat
  [1,16,0,16,0,0,0,4,0,1,0,-4,0,0, ldraw_lib__4_4edge(realsolid)],
// 0 //
];
module ldraw_lib__48495(step=0, col=false, unit=2/5, alt=false, line=0.2, solid=!$preview)
    makepoly(ldraw_lib__48495(solid), step=step, col=col, unit=unit, alt=alt, line=line, solid=solid);
ldraw_lib__48495(line=0.2);
